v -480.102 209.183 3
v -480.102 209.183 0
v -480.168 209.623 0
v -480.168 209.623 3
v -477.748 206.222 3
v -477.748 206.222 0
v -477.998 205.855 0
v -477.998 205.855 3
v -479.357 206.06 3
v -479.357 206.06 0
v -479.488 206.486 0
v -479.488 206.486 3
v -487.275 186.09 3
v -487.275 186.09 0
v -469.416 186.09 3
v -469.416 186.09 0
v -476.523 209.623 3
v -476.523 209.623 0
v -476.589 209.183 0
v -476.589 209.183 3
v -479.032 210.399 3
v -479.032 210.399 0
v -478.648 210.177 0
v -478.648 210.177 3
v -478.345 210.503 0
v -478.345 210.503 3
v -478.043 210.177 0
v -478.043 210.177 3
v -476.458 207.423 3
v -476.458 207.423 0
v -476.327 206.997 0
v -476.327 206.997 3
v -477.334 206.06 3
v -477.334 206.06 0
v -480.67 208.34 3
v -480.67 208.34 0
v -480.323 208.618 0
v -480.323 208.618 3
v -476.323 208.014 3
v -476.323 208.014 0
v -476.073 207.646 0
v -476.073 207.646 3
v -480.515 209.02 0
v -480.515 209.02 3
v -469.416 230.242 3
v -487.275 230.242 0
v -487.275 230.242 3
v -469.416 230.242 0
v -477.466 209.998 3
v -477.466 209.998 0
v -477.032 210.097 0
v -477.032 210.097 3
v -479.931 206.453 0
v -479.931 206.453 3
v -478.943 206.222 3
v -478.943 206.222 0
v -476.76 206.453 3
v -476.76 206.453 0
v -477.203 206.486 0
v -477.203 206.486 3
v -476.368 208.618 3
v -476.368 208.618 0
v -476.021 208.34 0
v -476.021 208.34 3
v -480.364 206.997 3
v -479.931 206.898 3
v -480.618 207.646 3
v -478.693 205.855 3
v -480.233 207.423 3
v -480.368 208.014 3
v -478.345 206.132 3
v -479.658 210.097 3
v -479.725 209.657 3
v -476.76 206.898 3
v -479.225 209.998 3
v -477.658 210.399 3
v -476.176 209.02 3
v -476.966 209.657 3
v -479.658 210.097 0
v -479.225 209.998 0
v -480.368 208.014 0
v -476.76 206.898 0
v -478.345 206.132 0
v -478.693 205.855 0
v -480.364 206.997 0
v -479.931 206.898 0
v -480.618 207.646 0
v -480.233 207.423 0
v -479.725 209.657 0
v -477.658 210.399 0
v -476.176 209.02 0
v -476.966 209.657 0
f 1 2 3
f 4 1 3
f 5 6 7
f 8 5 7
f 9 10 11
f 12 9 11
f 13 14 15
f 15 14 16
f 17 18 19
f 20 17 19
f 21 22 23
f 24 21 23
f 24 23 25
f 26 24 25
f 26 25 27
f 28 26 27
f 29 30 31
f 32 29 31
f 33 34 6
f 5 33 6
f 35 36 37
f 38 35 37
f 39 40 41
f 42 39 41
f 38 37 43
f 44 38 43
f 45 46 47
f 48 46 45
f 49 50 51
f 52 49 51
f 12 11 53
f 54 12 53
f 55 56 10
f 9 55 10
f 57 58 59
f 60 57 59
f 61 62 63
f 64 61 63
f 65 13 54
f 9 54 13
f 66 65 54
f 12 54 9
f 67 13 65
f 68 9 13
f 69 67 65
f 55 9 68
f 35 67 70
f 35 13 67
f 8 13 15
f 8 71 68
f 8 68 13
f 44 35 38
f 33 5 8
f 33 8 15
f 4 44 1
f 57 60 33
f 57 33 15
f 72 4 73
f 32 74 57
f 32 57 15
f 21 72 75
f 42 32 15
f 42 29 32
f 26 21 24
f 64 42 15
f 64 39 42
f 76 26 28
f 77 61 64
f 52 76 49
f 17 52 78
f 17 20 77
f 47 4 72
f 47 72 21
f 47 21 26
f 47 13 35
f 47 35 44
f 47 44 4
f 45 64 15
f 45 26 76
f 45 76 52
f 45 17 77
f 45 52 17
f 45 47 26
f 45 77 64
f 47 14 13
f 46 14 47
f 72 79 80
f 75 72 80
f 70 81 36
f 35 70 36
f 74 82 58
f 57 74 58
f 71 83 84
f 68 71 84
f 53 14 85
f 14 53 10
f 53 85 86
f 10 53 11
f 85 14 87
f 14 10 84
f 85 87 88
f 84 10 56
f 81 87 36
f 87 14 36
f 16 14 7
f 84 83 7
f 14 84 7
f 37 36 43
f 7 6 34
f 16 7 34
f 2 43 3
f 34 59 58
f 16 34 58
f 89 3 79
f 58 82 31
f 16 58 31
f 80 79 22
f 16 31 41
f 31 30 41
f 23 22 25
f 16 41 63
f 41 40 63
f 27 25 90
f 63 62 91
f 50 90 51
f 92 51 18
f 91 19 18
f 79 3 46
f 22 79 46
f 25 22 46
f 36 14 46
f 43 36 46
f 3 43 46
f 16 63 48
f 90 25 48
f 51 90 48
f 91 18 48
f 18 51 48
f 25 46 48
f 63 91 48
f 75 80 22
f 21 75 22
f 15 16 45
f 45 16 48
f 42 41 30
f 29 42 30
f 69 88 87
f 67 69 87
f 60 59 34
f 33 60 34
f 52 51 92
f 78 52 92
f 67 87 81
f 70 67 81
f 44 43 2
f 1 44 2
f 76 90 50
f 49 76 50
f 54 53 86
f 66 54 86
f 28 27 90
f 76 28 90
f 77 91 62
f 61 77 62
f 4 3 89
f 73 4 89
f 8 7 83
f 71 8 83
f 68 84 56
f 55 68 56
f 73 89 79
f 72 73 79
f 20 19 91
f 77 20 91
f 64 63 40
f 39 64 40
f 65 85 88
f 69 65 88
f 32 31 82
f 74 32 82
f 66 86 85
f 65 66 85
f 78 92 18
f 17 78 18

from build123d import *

# Parameters (mm, degrees)
MODEL_W             = 17.8592
MODEL_H             = 44.1523
BOSS_EXTRUDE1_DEPTH = 3


with BuildPart() as part:
    # Model → Boss-Extrude1 (new body)
    with BuildSketch(Plane.XY):
        with Locations((-478.3454, 208.16575)):
            Rectangle(MODEL_W, MODEL_H)
        Polygon((-478.3454, 210.503), (-478.0431, 210.1768), (-477.6584, 210.3991), (-477.4655, 209.9981), (-477.0325, 210.0969), (-476.9659, 209.6567), (-476.5232, 209.623), (-476.589, 209.1827), (-476.1758, 209.0197), (-476.3682, 208.6184), (-476.0213, 208.3405), (-476.323, 208.0138), (-476.0732, 207.6458), (-476.4575, 207.4228), (-476.327, 206.9973), (-476.7598, 206.8979), (-476.7601, 206.4526), (-477.2029, 206.4855), (-477.3341, 206.0602), (-477.7476, 206.2225), (-477.998, 205.8548), (-478.3454, 206.1321), (-478.6928, 205.8548), (-478.9432, 206.2225), (-479.3567, 206.0602), (-479.4879, 206.4855), (-479.9307, 206.4526), (-479.931, 206.8979), (-480.3638, 206.9973), (-480.2333, 207.4228), (-480.6176, 207.6458), (-480.3678, 208.0138), (-480.6695, 208.3405), (-480.3226, 208.6184), (-480.515, 209.0197), (-480.1018, 209.1827), (-480.1676, 209.623), (-479.7249, 209.6567), (-479.6583, 210.0969), (-479.2253, 209.9981), (-479.0324, 210.3991), (-478.6477, 210.1768), align=None, mode=Mode.SUBTRACT)
    extrude(amount=BOSS_EXTRUDE1_DEPTH)


solid = part.part
